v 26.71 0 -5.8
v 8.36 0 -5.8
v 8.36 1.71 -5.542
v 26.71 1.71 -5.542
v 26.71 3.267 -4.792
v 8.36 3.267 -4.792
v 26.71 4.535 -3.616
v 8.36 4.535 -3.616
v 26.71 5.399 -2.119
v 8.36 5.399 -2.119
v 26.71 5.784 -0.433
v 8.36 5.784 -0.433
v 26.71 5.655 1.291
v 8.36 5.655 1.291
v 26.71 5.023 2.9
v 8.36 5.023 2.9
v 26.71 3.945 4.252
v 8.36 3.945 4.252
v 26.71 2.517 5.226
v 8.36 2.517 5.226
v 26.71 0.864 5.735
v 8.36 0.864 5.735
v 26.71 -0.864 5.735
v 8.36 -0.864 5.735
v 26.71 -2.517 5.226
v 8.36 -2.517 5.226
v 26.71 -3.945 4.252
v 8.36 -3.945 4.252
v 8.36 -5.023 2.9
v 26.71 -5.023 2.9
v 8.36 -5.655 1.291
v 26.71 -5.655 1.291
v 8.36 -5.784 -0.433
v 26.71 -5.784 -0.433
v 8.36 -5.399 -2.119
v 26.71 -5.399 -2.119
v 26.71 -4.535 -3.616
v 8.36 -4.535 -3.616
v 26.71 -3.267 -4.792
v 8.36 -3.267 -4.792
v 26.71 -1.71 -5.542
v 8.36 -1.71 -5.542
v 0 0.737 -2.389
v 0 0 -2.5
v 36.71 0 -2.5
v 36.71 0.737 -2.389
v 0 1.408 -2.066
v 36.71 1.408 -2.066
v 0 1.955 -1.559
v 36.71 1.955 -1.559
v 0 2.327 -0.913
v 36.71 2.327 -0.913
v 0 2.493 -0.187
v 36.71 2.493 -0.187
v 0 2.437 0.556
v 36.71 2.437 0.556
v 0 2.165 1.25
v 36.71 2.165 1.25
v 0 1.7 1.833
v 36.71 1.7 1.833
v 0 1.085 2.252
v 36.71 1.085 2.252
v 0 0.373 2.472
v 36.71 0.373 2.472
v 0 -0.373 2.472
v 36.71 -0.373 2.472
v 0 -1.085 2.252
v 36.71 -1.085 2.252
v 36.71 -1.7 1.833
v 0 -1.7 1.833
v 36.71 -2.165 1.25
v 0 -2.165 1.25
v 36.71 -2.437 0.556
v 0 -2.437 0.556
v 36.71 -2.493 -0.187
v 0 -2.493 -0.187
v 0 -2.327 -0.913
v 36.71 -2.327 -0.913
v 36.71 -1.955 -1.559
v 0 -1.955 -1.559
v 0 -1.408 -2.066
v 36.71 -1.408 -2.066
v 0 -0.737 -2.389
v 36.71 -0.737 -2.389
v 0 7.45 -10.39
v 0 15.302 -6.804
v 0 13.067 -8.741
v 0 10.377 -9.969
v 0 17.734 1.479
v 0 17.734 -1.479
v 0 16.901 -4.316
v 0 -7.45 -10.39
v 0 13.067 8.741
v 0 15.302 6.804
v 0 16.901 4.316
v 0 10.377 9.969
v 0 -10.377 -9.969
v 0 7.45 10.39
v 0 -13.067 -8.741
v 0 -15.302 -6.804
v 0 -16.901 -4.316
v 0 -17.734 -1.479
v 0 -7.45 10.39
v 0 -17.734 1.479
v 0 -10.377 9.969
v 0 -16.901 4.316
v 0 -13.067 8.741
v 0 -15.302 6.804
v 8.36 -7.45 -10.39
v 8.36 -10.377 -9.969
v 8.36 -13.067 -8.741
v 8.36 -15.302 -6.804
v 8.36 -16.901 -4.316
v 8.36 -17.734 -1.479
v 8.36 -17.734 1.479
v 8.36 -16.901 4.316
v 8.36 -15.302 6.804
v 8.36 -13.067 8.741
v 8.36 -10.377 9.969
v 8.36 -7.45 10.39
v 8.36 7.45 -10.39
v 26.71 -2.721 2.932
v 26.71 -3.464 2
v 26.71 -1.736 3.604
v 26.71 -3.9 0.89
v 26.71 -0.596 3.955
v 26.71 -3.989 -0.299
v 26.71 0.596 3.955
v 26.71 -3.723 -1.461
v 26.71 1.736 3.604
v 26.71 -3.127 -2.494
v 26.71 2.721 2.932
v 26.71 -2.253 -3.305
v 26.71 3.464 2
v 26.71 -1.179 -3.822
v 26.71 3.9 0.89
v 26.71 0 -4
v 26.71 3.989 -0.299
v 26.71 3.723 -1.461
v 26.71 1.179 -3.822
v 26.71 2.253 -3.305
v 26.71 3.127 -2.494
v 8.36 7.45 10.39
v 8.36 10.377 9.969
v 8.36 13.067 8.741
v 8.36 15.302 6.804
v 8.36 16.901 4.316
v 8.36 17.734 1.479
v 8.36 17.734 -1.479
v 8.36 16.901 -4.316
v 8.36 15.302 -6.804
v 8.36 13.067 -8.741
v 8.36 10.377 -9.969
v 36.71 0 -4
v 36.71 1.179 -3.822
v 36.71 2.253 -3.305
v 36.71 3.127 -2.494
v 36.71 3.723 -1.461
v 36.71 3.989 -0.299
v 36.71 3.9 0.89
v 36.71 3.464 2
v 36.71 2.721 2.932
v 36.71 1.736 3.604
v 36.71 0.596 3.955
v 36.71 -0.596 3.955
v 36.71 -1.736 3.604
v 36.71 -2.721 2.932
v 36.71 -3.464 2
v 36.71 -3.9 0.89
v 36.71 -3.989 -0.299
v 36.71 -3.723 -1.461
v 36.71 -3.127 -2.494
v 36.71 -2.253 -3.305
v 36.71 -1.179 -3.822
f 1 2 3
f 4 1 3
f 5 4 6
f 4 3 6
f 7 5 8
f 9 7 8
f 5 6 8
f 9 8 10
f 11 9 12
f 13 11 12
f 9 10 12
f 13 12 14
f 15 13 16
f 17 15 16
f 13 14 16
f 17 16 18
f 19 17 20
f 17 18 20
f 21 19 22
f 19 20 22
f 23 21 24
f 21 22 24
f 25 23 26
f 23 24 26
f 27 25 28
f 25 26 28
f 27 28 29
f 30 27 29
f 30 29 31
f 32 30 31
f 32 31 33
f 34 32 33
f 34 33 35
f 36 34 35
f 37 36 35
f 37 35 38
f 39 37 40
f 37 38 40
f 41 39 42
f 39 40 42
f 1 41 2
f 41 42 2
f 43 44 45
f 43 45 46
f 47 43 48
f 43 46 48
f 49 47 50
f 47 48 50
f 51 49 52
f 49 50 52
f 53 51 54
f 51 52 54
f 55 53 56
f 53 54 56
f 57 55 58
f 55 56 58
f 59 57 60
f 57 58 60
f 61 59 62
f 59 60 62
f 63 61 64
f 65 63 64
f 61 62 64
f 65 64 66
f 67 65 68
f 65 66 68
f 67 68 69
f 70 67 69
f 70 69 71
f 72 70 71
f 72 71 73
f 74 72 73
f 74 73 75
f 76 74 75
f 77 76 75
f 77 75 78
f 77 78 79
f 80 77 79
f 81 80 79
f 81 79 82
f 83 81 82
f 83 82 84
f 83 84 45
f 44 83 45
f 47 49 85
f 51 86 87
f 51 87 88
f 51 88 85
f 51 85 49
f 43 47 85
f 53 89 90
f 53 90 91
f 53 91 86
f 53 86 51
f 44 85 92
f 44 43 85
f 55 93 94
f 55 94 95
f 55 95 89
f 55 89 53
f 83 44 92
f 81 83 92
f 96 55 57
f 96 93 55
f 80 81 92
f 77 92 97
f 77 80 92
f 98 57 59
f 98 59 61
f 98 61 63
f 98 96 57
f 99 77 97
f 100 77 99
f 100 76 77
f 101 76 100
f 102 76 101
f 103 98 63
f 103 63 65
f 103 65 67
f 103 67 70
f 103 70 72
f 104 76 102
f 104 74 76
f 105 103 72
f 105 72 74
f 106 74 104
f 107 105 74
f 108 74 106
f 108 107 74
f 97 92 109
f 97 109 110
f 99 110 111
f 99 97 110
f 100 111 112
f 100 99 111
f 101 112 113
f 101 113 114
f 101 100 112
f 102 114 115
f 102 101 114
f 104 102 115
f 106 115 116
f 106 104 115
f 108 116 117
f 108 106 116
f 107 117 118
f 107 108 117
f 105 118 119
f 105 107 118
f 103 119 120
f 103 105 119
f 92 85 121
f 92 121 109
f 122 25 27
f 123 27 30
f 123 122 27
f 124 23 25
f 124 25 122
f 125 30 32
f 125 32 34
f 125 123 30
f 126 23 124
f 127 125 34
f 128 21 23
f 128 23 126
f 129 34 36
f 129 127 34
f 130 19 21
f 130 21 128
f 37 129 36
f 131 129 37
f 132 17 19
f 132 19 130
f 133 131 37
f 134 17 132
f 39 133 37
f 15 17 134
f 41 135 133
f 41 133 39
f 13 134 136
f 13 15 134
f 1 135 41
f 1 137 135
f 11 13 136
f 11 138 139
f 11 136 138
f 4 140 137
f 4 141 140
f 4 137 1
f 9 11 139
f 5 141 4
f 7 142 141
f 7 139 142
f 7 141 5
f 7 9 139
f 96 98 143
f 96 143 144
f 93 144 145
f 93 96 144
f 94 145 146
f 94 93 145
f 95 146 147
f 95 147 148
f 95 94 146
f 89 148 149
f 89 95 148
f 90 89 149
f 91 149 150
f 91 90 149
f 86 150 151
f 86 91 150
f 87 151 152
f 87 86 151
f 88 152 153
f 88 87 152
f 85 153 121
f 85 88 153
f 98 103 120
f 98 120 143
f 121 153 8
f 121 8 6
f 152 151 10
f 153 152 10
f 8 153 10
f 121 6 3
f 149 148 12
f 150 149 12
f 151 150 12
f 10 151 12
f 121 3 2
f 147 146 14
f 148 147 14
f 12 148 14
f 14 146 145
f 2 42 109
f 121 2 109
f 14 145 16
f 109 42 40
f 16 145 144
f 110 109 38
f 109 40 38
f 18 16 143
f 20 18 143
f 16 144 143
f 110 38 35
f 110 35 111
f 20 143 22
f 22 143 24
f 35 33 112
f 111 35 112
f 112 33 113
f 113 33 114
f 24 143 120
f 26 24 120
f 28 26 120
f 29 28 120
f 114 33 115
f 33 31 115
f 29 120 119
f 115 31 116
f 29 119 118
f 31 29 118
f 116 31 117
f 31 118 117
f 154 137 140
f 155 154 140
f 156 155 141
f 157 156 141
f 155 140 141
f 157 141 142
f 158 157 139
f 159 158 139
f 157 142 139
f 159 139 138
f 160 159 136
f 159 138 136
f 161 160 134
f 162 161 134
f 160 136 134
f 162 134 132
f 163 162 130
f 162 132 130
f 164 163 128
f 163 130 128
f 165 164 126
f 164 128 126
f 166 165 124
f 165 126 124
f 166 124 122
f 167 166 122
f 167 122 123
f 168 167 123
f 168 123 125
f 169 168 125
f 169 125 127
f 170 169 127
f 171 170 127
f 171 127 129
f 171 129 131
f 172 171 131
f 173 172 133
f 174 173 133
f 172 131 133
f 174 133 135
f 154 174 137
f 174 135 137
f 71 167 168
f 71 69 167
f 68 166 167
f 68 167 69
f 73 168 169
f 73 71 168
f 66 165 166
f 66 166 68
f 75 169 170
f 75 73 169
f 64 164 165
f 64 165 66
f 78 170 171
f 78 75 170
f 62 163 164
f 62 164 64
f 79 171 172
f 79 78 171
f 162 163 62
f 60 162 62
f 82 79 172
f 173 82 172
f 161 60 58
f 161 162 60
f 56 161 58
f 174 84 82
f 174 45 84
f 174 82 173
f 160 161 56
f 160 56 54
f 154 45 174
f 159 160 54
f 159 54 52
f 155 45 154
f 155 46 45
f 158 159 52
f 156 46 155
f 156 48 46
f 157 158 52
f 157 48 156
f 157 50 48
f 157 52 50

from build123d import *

# Parameters (mm, degrees)
BOSS_EXTRUDE1_DEPTH = 8.36
SKETCH2_R           = 5.8
BOSS_EXTRUDE2_DEPTH = 18.35
SKETCH3_R           = 4
BOSS_EXTRUDE3_DEPTH = 10
SKETCH4_R           = 2.5
CUT_EXTRUDE1_DEPTH  = 43.117001318


with BuildPart() as part:
    # Sketch1 → Boss-Extrude1 (new body)
    with BuildSketch(Plane.YZ):
        with BuildLine():
            Line((-7.45, 10.39), (7.45, 10.39))
            ThreePointArc((7.45, 10.39), (17.84, 0), (7.45, -10.39))
            Line((7.45, -10.39), (-7.45, -10.39))
            ThreePointArc((-7.45, -10.39), (-17.84, 0), (-7.45, 10.39))
        make_face()
    extrude(amount=BOSS_EXTRUDE1_DEPTH)

    # Sketch2 → Boss-Extrude2 (add)
    with BuildSketch(Plane.YZ.offset(8.36)):
        with Locations(Location((0, 0, 0), (0, 0, 270))):
            Circle(SKETCH2_R)
    extrude(amount=BOSS_EXTRUDE2_DEPTH)

    # Sketch3 → Boss-Extrude3 (add)
    with BuildSketch(Plane.YZ.offset(26.71)):
        with Locations(Location((0, 0, 0), (0, 0, 270))):
            Circle(SKETCH3_R)
    extrude(amount=BOSS_EXTRUDE3_DEPTH)

    # Sketch4 → Cut-Extrude1 (cut, through all)
    with BuildSketch(Plane.YZ.offset(36.71)):
        with Locations(Location((0, 0, 0), (0, 0, 270))):
            Circle(SKETCH4_R)
    extrude(amount=-CUT_EXTRUDE1_DEPTH, mode=Mode.SUBTRACT)


solid = part.part
